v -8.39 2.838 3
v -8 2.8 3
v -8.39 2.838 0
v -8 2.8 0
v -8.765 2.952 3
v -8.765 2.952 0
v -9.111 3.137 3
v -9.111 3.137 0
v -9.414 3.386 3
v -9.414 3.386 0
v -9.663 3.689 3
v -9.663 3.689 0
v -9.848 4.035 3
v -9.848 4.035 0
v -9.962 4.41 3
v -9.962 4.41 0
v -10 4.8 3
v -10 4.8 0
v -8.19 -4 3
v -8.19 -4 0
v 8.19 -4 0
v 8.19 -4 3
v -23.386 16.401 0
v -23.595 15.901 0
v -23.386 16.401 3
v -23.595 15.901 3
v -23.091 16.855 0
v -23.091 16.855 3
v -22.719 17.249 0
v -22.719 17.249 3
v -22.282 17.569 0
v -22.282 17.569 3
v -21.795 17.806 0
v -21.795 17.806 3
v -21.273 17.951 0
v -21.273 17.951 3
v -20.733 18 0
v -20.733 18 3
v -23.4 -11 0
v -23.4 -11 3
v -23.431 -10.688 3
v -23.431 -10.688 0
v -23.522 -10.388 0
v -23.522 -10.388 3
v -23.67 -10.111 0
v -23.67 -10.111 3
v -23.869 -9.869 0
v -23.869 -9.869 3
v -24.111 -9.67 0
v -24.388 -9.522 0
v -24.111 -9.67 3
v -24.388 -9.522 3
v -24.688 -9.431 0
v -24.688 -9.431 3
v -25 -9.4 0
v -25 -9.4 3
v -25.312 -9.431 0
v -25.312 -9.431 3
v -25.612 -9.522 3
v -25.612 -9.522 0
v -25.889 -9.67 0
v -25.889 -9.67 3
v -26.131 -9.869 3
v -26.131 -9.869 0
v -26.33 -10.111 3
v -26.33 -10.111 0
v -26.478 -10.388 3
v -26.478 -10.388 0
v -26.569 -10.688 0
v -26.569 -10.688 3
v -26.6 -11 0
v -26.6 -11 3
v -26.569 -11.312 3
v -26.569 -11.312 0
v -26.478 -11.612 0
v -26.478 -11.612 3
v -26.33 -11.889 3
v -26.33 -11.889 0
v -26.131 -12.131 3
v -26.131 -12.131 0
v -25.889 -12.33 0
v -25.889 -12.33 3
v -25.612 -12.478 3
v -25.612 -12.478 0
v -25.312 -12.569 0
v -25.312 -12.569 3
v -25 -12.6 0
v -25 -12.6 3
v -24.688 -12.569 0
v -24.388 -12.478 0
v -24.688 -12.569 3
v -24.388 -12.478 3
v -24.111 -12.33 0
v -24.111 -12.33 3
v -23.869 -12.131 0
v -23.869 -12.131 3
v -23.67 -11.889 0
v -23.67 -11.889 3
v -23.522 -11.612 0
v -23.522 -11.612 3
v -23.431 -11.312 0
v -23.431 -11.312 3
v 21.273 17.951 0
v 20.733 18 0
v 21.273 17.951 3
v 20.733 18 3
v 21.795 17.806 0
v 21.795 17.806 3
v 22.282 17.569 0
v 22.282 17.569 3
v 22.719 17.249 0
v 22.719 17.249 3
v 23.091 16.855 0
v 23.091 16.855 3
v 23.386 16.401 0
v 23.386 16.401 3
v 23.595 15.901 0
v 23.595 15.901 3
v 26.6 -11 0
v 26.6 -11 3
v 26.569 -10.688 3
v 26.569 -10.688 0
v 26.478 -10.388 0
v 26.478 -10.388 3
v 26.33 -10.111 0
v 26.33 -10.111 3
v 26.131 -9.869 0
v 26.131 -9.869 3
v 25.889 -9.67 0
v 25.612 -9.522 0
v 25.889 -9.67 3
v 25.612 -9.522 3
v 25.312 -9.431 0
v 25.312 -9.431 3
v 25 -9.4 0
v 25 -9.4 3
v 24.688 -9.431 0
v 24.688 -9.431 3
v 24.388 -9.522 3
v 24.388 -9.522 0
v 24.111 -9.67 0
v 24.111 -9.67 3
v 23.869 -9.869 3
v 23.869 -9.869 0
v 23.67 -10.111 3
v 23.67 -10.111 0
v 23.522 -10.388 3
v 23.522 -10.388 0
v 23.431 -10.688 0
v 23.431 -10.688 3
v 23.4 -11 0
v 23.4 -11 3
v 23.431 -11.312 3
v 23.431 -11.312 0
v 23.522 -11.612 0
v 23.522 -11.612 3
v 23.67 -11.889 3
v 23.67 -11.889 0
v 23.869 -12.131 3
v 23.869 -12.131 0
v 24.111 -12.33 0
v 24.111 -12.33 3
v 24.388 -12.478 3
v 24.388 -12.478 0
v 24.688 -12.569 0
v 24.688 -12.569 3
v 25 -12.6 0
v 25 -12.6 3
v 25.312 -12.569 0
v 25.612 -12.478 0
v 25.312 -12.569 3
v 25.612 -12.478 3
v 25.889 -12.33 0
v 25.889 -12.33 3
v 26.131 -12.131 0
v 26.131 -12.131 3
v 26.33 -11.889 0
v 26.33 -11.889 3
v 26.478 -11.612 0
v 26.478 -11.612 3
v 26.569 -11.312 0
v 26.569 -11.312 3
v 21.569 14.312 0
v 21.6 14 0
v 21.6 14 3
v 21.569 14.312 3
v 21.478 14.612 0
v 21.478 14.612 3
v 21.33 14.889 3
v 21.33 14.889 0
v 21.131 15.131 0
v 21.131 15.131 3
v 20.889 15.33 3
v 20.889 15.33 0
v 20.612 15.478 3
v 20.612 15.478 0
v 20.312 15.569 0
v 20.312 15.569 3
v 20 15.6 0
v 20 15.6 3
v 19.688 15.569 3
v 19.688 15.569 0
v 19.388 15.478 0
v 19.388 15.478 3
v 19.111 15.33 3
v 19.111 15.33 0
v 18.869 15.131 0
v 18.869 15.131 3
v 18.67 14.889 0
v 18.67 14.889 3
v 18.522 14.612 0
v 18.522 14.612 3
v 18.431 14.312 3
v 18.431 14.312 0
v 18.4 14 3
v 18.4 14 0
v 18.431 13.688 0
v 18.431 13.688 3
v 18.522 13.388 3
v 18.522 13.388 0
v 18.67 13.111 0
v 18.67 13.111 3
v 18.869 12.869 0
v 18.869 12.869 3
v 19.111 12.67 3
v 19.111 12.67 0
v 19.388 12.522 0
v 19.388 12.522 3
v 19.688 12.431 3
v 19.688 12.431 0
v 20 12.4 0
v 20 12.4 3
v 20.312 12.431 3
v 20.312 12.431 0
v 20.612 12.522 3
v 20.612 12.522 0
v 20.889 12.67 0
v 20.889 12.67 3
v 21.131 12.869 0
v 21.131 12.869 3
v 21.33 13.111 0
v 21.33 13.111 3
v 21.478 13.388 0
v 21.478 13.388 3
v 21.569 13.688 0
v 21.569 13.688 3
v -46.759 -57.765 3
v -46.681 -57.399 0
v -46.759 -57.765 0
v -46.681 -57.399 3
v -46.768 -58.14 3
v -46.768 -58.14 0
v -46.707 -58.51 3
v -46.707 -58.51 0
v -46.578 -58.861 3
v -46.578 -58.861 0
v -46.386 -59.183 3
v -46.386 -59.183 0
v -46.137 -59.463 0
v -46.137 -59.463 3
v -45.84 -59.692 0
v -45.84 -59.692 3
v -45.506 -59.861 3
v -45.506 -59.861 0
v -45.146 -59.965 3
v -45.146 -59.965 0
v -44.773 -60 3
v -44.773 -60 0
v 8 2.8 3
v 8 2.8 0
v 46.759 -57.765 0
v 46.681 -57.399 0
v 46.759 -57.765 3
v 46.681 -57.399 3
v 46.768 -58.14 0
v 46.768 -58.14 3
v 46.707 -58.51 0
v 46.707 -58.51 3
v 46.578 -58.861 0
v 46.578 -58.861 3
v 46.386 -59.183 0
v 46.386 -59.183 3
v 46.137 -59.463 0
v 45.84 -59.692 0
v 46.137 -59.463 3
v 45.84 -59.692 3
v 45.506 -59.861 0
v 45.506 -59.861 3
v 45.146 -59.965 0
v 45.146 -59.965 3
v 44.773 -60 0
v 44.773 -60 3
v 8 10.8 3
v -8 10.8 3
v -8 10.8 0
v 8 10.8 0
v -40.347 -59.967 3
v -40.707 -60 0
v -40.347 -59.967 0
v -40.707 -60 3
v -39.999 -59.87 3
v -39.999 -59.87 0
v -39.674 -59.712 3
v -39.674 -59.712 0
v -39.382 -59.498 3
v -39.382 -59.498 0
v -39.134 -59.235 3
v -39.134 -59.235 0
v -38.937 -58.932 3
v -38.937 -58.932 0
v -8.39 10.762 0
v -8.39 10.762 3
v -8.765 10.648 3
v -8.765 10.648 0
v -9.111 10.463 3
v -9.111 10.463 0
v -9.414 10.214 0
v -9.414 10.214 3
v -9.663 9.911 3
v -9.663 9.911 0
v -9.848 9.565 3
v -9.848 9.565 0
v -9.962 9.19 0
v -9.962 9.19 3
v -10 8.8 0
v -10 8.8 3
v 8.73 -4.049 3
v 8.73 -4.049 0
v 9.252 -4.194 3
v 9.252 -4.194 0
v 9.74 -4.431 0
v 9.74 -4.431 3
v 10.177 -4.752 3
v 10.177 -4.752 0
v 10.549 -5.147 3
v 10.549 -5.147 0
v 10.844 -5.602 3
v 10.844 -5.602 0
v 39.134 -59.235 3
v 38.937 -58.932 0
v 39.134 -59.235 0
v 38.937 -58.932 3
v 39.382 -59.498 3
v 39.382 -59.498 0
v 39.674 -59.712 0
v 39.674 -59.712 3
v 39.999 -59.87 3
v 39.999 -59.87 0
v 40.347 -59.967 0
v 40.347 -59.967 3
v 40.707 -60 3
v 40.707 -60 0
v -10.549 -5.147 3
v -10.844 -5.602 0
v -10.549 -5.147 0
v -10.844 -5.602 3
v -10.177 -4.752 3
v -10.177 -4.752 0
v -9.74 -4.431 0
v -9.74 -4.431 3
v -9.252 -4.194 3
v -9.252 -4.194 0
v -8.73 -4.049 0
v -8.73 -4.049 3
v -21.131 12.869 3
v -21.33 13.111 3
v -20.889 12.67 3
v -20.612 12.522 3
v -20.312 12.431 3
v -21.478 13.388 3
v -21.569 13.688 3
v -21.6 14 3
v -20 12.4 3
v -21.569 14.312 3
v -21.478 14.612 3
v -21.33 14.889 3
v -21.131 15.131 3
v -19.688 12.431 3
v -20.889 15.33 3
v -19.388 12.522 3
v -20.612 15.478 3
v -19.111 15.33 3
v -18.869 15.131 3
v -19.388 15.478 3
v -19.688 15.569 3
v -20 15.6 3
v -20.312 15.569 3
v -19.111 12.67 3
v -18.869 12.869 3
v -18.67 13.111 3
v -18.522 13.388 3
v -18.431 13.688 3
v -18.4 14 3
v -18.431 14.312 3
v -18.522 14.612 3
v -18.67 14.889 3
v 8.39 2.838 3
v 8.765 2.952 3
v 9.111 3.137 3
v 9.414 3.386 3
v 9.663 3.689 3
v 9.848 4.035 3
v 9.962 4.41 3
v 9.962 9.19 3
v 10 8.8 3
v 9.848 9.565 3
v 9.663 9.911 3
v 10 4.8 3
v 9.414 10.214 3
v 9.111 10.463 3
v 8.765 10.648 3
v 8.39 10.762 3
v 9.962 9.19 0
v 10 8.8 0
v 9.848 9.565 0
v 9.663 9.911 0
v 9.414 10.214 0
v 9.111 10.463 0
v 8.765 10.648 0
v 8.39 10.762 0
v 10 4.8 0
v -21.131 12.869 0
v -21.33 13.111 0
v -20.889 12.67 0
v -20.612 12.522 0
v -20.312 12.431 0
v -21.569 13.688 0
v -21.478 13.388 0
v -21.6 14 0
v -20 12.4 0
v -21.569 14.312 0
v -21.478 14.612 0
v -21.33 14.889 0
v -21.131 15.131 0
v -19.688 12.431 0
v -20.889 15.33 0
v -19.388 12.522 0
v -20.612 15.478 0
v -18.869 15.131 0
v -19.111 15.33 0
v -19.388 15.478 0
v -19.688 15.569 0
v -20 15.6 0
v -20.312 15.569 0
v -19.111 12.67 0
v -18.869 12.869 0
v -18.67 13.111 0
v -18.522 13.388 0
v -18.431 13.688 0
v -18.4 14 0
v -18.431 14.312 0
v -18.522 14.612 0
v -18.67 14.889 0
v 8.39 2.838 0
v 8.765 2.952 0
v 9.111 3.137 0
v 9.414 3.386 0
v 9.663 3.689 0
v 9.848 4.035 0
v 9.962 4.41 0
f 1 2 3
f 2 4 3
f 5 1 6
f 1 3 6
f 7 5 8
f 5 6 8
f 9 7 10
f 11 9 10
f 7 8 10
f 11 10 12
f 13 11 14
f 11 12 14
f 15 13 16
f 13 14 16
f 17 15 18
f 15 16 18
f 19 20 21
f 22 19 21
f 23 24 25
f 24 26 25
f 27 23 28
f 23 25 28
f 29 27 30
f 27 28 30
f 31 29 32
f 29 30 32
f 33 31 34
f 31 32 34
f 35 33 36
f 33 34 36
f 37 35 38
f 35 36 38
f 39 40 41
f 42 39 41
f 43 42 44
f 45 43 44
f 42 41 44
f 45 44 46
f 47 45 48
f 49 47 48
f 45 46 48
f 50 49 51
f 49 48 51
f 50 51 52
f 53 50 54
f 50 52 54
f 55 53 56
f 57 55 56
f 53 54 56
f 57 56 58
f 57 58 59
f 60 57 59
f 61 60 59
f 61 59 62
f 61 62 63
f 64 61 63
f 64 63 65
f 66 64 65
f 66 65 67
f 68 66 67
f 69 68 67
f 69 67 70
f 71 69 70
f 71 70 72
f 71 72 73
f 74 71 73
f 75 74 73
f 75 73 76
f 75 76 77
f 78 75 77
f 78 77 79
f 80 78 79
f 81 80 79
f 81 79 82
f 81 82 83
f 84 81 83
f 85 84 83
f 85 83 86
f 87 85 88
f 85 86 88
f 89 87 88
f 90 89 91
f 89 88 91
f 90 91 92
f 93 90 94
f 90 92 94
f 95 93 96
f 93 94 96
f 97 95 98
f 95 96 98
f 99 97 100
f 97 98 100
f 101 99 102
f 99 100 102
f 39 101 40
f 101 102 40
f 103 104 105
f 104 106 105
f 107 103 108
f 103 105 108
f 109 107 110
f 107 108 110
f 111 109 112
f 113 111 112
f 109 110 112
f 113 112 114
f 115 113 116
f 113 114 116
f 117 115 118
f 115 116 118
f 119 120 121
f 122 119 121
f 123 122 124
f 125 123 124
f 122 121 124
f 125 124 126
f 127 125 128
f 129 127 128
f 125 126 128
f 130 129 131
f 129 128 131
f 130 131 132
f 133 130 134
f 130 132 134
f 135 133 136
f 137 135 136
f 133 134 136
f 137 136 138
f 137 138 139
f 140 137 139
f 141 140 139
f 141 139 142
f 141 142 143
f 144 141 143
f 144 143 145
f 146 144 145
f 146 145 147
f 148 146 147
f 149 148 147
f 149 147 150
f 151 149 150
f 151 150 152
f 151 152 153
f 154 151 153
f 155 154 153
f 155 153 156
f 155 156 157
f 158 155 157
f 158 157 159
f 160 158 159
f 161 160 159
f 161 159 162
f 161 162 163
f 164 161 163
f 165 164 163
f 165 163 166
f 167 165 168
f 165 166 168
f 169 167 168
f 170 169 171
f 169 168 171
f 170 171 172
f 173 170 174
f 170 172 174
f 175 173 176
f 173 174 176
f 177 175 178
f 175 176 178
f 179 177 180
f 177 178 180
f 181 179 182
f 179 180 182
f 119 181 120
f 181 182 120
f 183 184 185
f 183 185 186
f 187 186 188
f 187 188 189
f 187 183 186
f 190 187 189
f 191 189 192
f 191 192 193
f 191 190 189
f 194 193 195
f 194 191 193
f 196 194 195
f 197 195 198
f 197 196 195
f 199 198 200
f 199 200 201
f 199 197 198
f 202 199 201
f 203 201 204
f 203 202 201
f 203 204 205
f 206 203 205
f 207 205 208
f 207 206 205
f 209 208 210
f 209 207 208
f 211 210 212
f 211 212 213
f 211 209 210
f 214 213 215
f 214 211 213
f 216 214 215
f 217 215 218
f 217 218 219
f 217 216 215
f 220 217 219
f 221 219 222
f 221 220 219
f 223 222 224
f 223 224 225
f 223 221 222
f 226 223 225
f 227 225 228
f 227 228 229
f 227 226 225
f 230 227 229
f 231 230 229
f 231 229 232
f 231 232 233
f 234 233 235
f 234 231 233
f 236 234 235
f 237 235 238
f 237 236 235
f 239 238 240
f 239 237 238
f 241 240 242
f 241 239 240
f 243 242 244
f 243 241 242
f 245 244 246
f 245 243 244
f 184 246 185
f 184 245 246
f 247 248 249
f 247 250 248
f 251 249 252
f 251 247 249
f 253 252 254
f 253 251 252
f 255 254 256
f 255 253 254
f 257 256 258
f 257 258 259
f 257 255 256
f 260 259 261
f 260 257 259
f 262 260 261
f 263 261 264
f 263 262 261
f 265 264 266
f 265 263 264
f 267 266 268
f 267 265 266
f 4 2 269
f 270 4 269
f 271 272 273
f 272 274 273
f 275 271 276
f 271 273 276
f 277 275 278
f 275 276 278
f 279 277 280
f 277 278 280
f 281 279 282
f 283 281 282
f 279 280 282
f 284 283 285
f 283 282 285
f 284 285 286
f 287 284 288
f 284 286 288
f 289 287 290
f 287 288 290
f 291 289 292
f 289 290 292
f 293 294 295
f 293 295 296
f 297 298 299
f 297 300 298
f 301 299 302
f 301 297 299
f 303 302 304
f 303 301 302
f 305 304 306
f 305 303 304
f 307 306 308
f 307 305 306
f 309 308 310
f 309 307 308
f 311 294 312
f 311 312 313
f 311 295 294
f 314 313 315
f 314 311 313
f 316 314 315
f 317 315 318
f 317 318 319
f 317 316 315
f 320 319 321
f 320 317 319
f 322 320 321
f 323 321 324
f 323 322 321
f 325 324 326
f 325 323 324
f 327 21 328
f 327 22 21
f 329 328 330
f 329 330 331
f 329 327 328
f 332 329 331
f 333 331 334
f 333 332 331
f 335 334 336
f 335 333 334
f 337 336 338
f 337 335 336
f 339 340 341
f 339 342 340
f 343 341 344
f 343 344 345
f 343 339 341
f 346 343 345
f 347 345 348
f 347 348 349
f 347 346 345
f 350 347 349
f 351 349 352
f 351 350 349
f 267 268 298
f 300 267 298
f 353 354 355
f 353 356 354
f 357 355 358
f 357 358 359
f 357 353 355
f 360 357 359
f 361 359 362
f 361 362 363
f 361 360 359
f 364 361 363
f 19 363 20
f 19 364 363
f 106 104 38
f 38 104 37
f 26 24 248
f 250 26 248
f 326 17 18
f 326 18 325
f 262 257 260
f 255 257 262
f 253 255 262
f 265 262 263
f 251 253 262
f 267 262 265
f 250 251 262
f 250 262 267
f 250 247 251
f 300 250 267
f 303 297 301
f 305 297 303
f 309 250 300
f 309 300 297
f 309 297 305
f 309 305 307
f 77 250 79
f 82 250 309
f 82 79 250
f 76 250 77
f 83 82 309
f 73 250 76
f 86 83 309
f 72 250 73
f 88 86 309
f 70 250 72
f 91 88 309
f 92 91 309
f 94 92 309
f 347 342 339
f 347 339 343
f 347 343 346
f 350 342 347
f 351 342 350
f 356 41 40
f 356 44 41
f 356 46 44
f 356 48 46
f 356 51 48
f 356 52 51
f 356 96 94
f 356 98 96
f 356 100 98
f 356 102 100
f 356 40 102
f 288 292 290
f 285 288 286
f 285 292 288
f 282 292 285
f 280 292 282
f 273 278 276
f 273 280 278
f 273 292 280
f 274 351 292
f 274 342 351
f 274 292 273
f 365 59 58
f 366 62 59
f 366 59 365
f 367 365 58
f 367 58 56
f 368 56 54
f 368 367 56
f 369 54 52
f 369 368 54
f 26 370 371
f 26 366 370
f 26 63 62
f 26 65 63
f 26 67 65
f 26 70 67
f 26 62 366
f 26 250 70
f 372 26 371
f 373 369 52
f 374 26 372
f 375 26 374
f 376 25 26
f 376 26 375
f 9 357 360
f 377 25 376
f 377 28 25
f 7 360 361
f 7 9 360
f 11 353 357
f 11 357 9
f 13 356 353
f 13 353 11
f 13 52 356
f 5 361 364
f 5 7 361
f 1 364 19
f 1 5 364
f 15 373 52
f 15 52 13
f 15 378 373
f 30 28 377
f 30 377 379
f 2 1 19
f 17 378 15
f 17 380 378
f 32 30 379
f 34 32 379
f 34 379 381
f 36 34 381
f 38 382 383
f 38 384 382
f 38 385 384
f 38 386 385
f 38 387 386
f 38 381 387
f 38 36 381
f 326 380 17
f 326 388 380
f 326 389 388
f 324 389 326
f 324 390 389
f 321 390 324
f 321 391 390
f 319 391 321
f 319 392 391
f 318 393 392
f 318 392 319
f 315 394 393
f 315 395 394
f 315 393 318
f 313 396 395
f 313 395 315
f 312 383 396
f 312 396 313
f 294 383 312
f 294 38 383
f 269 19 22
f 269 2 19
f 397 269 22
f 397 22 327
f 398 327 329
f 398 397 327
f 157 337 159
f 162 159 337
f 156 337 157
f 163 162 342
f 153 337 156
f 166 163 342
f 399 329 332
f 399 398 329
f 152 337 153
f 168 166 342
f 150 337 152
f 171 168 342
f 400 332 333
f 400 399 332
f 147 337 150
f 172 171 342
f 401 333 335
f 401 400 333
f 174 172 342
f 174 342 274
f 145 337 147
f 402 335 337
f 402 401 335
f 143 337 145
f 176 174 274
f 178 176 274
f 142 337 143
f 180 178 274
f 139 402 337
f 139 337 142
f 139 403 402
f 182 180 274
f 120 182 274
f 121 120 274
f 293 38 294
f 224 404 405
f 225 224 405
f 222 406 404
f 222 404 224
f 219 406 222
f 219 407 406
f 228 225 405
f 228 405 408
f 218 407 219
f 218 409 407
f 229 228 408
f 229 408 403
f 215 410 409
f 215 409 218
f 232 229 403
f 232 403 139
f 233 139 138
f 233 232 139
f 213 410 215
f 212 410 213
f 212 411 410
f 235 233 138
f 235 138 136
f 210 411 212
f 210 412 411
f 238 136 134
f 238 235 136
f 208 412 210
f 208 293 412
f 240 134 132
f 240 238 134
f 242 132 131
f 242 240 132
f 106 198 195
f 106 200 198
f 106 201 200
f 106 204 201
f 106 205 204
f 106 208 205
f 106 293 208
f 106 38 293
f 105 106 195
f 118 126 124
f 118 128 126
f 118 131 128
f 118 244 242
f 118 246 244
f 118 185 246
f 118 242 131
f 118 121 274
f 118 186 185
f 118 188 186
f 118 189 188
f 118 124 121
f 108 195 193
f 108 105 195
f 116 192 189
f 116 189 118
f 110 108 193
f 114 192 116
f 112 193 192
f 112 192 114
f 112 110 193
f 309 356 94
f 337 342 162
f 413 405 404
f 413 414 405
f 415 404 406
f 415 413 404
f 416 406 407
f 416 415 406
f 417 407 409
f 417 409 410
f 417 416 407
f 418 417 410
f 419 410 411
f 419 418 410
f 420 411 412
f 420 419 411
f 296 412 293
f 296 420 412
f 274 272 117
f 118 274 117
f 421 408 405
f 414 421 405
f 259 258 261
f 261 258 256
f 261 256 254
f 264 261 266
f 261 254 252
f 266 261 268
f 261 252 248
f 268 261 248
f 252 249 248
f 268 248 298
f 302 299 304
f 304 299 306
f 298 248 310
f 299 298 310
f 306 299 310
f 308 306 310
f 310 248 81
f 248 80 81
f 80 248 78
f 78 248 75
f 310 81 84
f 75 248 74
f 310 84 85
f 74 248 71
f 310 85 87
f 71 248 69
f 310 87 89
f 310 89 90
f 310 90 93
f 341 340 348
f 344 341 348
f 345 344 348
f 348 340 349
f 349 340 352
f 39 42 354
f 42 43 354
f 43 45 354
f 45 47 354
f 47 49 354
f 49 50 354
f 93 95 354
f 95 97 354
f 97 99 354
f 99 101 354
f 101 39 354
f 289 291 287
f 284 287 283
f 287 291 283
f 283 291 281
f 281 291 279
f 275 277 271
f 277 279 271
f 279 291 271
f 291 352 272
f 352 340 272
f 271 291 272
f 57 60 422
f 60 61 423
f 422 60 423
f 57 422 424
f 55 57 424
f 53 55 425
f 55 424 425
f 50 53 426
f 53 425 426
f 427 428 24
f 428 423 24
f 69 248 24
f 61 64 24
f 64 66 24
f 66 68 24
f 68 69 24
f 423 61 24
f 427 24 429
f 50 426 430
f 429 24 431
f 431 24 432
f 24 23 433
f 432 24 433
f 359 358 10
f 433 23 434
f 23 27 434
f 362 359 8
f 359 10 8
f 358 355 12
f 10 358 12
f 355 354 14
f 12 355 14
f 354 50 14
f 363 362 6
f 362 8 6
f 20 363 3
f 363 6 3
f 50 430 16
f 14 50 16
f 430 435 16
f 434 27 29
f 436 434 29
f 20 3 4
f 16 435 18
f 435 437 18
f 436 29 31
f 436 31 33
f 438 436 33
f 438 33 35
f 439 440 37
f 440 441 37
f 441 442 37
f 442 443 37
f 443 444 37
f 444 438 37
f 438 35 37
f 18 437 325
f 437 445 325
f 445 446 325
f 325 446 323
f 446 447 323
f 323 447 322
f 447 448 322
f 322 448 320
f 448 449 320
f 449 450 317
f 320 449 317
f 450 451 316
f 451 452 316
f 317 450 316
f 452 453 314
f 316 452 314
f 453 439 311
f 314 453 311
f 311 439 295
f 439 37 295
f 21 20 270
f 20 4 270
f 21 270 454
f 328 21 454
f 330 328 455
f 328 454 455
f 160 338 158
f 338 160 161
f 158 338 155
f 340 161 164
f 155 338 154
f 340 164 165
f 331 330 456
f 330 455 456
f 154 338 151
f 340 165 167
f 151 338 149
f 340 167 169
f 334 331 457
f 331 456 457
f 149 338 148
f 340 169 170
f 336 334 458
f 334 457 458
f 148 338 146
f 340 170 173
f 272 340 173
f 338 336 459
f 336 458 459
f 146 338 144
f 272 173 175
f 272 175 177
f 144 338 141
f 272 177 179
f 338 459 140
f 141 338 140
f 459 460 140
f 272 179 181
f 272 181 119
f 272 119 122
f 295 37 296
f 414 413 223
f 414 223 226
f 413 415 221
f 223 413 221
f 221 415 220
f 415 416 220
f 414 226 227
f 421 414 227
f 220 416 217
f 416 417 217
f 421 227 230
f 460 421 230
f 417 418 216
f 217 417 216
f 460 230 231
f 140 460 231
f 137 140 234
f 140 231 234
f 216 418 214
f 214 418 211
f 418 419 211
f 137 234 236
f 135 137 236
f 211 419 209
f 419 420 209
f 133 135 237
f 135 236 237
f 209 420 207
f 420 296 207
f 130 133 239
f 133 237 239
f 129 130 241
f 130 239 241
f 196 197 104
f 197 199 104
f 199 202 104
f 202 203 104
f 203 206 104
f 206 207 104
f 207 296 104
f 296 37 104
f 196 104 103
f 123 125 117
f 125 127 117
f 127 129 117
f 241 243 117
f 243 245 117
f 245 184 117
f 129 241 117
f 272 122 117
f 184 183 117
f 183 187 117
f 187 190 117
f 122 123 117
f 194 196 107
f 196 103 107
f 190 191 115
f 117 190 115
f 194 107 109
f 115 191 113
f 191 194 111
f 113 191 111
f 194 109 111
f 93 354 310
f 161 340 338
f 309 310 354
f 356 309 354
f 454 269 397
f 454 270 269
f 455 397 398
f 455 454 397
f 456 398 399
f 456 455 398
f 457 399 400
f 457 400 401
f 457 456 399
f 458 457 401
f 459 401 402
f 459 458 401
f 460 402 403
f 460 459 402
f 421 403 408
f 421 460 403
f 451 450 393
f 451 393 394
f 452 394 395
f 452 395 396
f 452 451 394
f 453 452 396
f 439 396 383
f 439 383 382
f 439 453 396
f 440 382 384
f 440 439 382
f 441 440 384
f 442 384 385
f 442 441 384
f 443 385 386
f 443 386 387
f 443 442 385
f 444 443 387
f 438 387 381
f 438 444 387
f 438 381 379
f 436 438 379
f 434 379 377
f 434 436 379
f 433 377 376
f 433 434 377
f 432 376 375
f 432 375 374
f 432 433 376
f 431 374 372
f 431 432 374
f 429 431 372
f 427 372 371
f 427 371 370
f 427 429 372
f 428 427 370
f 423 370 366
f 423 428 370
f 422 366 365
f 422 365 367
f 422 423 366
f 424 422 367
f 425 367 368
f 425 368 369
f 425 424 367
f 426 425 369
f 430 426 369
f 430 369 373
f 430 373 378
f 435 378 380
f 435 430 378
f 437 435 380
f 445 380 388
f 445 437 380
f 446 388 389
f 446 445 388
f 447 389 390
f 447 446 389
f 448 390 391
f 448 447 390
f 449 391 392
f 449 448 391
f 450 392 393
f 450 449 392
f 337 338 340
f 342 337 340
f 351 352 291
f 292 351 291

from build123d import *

# Parameters (mm, degrees)
SKETCH_2_R          = 1.6
EXTRUDE_1_DEPTH     = 3
FILLET_1_R          = 3
FILLET_2_R          = 2
FILLET_3_R          = 3
SKETCH_4_W          = 20
SKETCH_4_H          = 8
CUT_EXTRUDE_2_DEPTH = 77.136305652
FILLET_5_R          = 2
SKETCH_5_R          = 1.6
CUT_EXTRUDE_3_DEPTH = 77.136305652


with BuildPart() as part:
    # 草图2 → 凸台-拉伸1 (new body)
    with BuildSketch(Plane.XY):
        Polygon((-22.933897075, 18), (-47.5, -60), (-39.5, -60), (-10, -4), (10, -4), (39.5, -60), (47.5, -60), (22.933897075, 18), align=None)
        with Locations((-20, 14)):
            Circle(SKETCH_2_R, mode=Mode.SUBTRACT)
        with Locations((20, 14)):
            Circle(SKETCH_2_R, mode=Mode.SUBTRACT)
    extrude(amount=EXTRUDE_1_DEPTH)

    # 圆角1
    fillet_1_edges = [part.edges().sort_by_distance(p)[0] for p in [
        (22.933897075, 18, 1.5),
        (-22.933897075, 18, 1.5),
    ]]
    fillet(fillet_1_edges, radius=FILLET_1_R)

    # 圆角2
    fillet_2_edges = [part.edges().sort_by_distance(p)[0] for p in [
        (47.5, -60, 1.5),
        (39.5, -60, 1.5),
        (-39.5, -60, 1.5),
        (-47.5, -60, 1.5),
    ]]
    fillet(fillet_2_edges, radius=FILLET_2_R)

    # 圆角3
    fillet_3_edges = [part.edges().sort_by_distance(p)[0] for p in [
        (10, -4, 1.5),
        (-10, -4, 1.5),
    ]]
    fillet(fillet_3_edges, radius=FILLET_3_R)

    # 草图4 → 切除-拉伸2 (cut, through all)
    with BuildSketch(Plane.XY.offset(3)):
        with Locations((0, 6.8)):
            Rectangle(SKETCH_4_W, SKETCH_4_H)
    extrude(amount=-CUT_EXTRUDE_2_DEPTH, mode=Mode.SUBTRACT)

    # 圆角5
    fillet_5_edges = [part.edges().sort_by_distance(p)[0] for p in [
        (-10, 2.8, 1.5),
        (-10, 10.8, 1.5),
        (10, 10.8, 1.5),
        (10, 2.8, 1.5),
    ]]
    fillet(fillet_5_edges, radius=FILLET_5_R)

    # 草图5 → 切除-拉伸3 (cut, through all)
    with BuildSketch(Plane.XY.offset(3)):
        with Locations((-25, -11)):
            Circle(SKETCH_5_R)
        with Locations((25, -11)):
            Circle(SKETCH_5_R)
    extrude(amount=-CUT_EXTRUDE_3_DEPTH, mode=Mode.SUBTRACT)


solid = part.part
